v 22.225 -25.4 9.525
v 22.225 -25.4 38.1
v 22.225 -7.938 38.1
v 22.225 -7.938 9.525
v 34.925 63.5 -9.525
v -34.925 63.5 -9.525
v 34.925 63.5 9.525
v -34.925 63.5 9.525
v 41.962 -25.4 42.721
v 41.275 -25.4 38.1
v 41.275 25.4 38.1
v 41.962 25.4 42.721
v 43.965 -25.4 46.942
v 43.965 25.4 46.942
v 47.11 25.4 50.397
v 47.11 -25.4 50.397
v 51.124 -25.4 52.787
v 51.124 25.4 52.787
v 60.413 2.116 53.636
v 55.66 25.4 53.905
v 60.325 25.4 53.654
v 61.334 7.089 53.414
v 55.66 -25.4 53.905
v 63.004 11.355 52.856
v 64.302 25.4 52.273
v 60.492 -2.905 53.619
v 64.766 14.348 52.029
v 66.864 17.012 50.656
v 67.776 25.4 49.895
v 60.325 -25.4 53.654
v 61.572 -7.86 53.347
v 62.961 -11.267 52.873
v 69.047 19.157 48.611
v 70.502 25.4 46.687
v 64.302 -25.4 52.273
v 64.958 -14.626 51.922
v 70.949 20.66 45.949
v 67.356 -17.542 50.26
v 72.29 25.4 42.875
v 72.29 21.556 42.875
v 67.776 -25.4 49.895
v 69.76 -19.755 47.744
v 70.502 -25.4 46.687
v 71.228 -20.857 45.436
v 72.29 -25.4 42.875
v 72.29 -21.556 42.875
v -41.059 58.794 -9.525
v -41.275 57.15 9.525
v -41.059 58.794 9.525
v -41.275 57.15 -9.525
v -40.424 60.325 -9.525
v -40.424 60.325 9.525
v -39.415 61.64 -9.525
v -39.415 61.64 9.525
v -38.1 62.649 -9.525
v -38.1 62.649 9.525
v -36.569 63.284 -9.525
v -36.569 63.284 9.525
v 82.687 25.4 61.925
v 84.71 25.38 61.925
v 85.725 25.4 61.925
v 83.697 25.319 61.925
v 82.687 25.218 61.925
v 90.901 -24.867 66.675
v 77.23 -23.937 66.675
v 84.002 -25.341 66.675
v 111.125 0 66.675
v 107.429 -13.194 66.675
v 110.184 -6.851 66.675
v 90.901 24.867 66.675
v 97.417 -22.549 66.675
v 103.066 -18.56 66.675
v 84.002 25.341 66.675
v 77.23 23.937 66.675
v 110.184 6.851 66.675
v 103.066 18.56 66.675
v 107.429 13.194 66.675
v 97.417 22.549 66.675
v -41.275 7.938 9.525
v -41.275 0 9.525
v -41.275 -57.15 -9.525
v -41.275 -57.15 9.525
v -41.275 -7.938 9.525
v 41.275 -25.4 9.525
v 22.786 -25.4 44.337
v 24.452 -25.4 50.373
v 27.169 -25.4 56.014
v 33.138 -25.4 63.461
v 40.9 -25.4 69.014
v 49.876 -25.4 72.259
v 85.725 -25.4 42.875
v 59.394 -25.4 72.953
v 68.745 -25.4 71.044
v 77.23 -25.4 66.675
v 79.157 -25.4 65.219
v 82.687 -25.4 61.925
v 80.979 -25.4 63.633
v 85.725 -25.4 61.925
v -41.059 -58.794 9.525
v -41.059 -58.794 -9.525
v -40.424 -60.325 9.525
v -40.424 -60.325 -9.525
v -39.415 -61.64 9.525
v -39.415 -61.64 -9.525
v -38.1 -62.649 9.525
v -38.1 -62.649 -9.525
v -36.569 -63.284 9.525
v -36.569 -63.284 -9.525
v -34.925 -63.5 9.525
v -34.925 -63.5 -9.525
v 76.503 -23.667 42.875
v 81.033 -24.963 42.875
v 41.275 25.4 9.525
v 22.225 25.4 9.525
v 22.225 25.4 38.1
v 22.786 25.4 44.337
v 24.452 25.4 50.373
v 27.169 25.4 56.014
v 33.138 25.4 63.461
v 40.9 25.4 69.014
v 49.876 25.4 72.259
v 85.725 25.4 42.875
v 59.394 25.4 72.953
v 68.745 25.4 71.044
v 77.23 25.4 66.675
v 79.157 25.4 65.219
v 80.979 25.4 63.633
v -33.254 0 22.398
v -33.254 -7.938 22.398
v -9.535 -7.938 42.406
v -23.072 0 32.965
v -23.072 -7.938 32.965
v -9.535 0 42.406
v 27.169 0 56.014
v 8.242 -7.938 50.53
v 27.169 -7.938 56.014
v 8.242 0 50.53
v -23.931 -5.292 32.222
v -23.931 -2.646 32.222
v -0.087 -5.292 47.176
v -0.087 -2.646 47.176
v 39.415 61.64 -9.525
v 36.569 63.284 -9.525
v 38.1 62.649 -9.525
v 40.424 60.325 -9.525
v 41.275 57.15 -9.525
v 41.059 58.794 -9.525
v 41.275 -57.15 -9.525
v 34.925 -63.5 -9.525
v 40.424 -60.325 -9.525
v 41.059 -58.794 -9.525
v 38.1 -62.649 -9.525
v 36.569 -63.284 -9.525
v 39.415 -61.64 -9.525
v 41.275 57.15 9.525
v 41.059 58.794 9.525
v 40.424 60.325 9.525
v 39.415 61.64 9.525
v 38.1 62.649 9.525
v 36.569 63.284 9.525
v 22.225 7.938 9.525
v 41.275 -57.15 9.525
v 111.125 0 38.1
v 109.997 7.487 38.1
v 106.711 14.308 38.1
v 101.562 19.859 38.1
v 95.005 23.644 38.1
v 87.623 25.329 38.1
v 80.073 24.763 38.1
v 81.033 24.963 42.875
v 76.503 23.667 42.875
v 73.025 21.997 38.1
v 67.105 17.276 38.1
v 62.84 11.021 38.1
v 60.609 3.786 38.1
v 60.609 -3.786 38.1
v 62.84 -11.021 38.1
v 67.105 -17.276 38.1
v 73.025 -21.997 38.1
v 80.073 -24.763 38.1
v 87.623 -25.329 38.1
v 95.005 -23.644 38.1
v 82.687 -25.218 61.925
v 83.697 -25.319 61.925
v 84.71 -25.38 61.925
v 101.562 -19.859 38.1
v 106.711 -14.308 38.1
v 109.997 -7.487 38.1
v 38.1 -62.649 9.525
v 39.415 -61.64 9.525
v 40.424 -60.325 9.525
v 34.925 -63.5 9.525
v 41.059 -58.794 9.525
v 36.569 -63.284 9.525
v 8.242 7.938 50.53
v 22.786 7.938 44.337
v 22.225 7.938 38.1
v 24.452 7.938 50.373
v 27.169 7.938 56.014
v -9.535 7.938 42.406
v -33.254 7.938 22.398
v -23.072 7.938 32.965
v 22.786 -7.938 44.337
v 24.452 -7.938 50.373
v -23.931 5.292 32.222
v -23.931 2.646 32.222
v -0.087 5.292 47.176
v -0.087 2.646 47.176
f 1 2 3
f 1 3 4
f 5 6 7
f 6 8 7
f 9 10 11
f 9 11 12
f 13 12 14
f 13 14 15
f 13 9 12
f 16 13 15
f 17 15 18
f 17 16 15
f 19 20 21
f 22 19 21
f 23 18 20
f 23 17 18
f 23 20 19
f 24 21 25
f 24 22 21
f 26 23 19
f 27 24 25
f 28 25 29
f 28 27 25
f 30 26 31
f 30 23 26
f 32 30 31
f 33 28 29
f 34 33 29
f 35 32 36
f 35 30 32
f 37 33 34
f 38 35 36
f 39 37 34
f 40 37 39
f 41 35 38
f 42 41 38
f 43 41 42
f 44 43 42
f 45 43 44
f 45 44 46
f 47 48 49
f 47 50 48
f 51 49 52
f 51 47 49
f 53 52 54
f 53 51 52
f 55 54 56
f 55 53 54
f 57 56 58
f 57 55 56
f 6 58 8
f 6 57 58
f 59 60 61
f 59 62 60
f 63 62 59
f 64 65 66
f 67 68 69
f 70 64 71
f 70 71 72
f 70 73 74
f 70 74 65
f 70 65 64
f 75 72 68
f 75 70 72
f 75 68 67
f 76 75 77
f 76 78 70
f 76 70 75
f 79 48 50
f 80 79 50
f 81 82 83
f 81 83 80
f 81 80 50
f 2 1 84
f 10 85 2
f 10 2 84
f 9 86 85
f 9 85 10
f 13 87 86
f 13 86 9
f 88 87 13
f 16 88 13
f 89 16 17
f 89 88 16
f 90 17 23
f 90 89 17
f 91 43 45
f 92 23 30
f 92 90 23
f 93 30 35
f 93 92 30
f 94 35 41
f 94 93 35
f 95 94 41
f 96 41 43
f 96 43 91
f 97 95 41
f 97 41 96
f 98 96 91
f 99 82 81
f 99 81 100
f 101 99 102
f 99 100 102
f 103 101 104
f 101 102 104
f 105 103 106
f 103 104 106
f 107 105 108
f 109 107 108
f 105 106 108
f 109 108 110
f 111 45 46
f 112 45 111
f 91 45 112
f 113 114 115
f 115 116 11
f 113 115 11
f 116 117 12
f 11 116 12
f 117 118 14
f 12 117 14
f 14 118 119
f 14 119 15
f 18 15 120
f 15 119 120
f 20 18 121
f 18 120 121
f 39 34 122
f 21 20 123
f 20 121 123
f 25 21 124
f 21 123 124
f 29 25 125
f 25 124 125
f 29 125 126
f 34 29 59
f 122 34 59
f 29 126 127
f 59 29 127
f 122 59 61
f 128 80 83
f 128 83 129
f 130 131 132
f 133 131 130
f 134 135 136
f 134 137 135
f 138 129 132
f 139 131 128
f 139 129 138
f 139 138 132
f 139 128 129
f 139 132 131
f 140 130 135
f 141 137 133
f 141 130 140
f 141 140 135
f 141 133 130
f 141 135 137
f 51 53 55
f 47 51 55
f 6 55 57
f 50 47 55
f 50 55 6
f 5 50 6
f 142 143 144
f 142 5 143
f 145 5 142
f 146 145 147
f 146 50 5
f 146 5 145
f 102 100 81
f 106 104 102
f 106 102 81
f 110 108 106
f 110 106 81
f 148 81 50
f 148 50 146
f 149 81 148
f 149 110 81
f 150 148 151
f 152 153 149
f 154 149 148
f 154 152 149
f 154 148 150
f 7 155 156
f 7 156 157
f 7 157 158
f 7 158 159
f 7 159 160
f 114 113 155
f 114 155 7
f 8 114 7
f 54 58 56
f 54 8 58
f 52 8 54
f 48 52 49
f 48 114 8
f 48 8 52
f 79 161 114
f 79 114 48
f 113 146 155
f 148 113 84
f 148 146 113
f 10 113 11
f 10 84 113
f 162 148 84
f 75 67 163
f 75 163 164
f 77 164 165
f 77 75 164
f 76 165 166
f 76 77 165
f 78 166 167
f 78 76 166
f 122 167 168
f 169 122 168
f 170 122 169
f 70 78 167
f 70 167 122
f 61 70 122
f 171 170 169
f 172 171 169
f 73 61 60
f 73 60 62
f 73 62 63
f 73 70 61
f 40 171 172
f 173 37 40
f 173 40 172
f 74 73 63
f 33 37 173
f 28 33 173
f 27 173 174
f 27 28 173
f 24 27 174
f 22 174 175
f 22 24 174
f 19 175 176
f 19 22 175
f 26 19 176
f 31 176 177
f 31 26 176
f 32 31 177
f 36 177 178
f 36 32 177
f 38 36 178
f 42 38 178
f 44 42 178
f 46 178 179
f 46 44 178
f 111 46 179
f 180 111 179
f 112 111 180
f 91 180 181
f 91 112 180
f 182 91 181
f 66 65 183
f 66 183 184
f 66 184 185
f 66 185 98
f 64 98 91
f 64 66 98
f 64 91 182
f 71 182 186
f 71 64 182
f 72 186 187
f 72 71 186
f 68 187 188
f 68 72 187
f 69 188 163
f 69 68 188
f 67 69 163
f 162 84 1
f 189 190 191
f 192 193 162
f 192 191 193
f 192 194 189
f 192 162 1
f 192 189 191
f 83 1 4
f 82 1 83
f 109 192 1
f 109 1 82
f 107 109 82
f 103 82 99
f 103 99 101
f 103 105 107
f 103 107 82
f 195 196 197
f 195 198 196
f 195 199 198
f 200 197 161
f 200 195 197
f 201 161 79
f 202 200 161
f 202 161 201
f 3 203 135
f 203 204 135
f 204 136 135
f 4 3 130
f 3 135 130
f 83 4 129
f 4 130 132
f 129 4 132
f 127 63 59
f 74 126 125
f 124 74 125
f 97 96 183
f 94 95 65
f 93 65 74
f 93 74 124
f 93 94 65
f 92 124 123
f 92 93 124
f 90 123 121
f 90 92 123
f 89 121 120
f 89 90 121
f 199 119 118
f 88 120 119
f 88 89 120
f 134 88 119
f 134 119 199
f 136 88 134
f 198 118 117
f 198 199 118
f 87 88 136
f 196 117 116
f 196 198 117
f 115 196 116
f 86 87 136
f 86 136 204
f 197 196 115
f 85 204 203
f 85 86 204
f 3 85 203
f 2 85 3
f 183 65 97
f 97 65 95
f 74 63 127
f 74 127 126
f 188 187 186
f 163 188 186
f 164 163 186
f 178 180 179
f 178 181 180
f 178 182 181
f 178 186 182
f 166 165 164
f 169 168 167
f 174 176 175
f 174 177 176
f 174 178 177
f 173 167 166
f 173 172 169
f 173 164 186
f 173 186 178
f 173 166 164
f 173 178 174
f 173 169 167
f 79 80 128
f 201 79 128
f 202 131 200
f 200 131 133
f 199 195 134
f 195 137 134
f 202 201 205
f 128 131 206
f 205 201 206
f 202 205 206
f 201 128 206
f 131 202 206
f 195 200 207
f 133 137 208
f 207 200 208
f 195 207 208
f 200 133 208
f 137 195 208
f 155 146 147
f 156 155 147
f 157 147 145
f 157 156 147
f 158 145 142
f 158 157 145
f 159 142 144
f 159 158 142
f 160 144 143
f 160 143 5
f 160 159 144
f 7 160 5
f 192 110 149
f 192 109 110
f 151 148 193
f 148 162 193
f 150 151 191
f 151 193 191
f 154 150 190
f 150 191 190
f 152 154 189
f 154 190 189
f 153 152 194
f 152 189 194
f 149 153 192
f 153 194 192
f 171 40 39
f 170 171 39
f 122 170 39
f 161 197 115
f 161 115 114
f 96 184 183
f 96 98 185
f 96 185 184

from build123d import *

# Parameters (mm, degrees)
F1_DEPTH = 63.5
F2_DEPTH = 25.4
F3_DEPTH = 7.9375
F5_R     = 6.35


with BuildPart() as f1:
    # F0 (on Front) → F1 (new body, symmetric)
    with BuildSketch(Plane.XZ):
        Polygon((-41.275, -9.525), (41.275, -9.525), (41.275, 9.525), (22.225, 9.525), (-41.275, 9.525), align=None)
    extrude(amount=F1_DEPTH, both=True)

    # F0 (on Front) → F2 (join, symmetric)
    with BuildSketch(Plane.XZ):
        with BuildLine():
            Line((22.225, 9.525), (41.275, 9.525))
            Line((41.275, 9.525), (41.275, 38.1))
            ThreePointArc((41.275, 38.1), (47.109768429, 50.3967221242), (60.325, 53.6542598667))
            Line((60.325, 53.6542598667), (60.325, 60.8617413577))
            add(Edge.make_bspline(
                [(27.1694495599, 56.0143021161), (38.4463876666, 58.5668881117), (49.8029060686, 60.022138531), (60.325, 60.8617413577)],
                knots=[78.5242181533, 78.5242181533, 78.5242181533, 78.5242181533, 110.2246687144, 110.2246687144, 110.2246687144, 110.2246687144], degree=3))
            ThreePointArc((27.1694495599, 56.0143021161), (23.4837977408, 47.3920638418), (22.225, 38.1))
            Line((22.225, 38.1), (22.225, 9.525))
        make_face()
        with BuildLine():
            ThreePointArc((77.2304631421, 66.675), (49.8756923374, 72.2590408681), (27.1694495599, 56.0143021161))
            add(Edge.make_bspline(
                [(27.1694495599, 56.0143021161), (38.4463876666, 58.5668881117), (49.8029060686, 60.022138531), (60.325, 60.8617413577)],
                knots=[78.5242181533, 78.5242181533, 78.5242181533, 78.5242181533, 110.2246687144, 110.2246687144, 110.2246687144, 110.2246687144], degree=3))
            Line((60.325, 60.8617413577), (60.325, 66.675))
            Line((60.325, 66.675), (77.2304631421, 66.675))
        make_face()
        with BuildLine():
            Line((60.325, 60.8617413577), (60.325, 53.6542598667))
            ThreePointArc((60.325, 53.6542598667), (67.7756703476, 49.8945222313), (72.2897850038, 42.8752))
            Line((72.2897850038, 42.8752), (85.725, 42.8752))
            Line((85.725, 42.8752), (85.725, 61.9252))
            Line((85.725, 61.9252), (82.6865516458, 61.9252))
            add(Edge.make_bspline(
                [(60.325, 60.8617413577), (68.4096639512, 61.5068512332), (76.0017140406, 61.7885051595), (82.6865516458, 61.9252)],
                knots=[110.2246687144, 110.2246687144, 110.2246687144, 110.2246687144, 134.5817493068, 134.5817493068, 134.5817493068, 134.5817493068], degree=3))
        make_face()
        with BuildLine():
            ThreePointArc((82.6865516458, 61.9252), (80.0818154438, 64.4417437815), (77.2304631421, 66.675))
            Line((77.2304631421, 66.675), (60.325, 66.675))
            Line((60.325, 66.675), (60.325, 60.8617413577))
            add(Edge.make_bspline(
                [(60.325, 60.8617413577), (68.4096639512, 61.5068512332), (76.0017140406, 61.7885051595), (82.6865516458, 61.9252)],
                knots=[110.2246687144, 110.2246687144, 110.2246687144, 110.2246687144, 134.5817493068, 134.5817493068, 134.5817493068, 134.5817493068], degree=3))
        make_face()
    extrude(amount=F2_DEPTH, both=True)

    # F0 (on Front) → F3 (join, symmetric)
    with BuildSketch(Plane.XZ):
        with BuildLine():
            add(Edge.make_bspline(
                [(-41.275, 9.525), (-28.2097739582, 36.6353245675), (-0.7643094977, 49.6913692863), (27.1694495599, 56.0143021161)],
                knots=[0, 0, 0, 0, 78.5242181533, 78.5242181533, 78.5242181533, 78.5242181533], degree=3))
            Line((-41.275, 9.525), (22.225, 9.525))
            Line((22.225, 9.525), (22.225, 38.1))
            ThreePointArc((22.225, 38.1), (23.4837977408, 47.3920638418), (27.1694495599, 56.0143021161))
        make_face()
    extrude(amount=F3_DEPTH, both=True)

    # F0 (on Front) → F4 (revolve)
    with BuildSketch(Plane.XZ):
        Polygon((111.125, 66.675), (85.725, 66.675), (85.725, 61.9252), (85.725, 42.8752), (85.725, 38.1), (111.125, 38.1), align=None)
    revolve(axis=Axis((85.725, 0, 52.3875), (0, 0, 1)))

    # F5
    f5_edges = [f1.edges().sort_by_distance(p)[0] for p in [
        (41.275, -63.5, 0),
        (41.275, 63.5, 0),
        (-41.275, 63.5, 0),
        (-41.275, -63.5, 0),
    ]]
    fillet(f5_edges, radius=F5_R)


solid = f1.part
